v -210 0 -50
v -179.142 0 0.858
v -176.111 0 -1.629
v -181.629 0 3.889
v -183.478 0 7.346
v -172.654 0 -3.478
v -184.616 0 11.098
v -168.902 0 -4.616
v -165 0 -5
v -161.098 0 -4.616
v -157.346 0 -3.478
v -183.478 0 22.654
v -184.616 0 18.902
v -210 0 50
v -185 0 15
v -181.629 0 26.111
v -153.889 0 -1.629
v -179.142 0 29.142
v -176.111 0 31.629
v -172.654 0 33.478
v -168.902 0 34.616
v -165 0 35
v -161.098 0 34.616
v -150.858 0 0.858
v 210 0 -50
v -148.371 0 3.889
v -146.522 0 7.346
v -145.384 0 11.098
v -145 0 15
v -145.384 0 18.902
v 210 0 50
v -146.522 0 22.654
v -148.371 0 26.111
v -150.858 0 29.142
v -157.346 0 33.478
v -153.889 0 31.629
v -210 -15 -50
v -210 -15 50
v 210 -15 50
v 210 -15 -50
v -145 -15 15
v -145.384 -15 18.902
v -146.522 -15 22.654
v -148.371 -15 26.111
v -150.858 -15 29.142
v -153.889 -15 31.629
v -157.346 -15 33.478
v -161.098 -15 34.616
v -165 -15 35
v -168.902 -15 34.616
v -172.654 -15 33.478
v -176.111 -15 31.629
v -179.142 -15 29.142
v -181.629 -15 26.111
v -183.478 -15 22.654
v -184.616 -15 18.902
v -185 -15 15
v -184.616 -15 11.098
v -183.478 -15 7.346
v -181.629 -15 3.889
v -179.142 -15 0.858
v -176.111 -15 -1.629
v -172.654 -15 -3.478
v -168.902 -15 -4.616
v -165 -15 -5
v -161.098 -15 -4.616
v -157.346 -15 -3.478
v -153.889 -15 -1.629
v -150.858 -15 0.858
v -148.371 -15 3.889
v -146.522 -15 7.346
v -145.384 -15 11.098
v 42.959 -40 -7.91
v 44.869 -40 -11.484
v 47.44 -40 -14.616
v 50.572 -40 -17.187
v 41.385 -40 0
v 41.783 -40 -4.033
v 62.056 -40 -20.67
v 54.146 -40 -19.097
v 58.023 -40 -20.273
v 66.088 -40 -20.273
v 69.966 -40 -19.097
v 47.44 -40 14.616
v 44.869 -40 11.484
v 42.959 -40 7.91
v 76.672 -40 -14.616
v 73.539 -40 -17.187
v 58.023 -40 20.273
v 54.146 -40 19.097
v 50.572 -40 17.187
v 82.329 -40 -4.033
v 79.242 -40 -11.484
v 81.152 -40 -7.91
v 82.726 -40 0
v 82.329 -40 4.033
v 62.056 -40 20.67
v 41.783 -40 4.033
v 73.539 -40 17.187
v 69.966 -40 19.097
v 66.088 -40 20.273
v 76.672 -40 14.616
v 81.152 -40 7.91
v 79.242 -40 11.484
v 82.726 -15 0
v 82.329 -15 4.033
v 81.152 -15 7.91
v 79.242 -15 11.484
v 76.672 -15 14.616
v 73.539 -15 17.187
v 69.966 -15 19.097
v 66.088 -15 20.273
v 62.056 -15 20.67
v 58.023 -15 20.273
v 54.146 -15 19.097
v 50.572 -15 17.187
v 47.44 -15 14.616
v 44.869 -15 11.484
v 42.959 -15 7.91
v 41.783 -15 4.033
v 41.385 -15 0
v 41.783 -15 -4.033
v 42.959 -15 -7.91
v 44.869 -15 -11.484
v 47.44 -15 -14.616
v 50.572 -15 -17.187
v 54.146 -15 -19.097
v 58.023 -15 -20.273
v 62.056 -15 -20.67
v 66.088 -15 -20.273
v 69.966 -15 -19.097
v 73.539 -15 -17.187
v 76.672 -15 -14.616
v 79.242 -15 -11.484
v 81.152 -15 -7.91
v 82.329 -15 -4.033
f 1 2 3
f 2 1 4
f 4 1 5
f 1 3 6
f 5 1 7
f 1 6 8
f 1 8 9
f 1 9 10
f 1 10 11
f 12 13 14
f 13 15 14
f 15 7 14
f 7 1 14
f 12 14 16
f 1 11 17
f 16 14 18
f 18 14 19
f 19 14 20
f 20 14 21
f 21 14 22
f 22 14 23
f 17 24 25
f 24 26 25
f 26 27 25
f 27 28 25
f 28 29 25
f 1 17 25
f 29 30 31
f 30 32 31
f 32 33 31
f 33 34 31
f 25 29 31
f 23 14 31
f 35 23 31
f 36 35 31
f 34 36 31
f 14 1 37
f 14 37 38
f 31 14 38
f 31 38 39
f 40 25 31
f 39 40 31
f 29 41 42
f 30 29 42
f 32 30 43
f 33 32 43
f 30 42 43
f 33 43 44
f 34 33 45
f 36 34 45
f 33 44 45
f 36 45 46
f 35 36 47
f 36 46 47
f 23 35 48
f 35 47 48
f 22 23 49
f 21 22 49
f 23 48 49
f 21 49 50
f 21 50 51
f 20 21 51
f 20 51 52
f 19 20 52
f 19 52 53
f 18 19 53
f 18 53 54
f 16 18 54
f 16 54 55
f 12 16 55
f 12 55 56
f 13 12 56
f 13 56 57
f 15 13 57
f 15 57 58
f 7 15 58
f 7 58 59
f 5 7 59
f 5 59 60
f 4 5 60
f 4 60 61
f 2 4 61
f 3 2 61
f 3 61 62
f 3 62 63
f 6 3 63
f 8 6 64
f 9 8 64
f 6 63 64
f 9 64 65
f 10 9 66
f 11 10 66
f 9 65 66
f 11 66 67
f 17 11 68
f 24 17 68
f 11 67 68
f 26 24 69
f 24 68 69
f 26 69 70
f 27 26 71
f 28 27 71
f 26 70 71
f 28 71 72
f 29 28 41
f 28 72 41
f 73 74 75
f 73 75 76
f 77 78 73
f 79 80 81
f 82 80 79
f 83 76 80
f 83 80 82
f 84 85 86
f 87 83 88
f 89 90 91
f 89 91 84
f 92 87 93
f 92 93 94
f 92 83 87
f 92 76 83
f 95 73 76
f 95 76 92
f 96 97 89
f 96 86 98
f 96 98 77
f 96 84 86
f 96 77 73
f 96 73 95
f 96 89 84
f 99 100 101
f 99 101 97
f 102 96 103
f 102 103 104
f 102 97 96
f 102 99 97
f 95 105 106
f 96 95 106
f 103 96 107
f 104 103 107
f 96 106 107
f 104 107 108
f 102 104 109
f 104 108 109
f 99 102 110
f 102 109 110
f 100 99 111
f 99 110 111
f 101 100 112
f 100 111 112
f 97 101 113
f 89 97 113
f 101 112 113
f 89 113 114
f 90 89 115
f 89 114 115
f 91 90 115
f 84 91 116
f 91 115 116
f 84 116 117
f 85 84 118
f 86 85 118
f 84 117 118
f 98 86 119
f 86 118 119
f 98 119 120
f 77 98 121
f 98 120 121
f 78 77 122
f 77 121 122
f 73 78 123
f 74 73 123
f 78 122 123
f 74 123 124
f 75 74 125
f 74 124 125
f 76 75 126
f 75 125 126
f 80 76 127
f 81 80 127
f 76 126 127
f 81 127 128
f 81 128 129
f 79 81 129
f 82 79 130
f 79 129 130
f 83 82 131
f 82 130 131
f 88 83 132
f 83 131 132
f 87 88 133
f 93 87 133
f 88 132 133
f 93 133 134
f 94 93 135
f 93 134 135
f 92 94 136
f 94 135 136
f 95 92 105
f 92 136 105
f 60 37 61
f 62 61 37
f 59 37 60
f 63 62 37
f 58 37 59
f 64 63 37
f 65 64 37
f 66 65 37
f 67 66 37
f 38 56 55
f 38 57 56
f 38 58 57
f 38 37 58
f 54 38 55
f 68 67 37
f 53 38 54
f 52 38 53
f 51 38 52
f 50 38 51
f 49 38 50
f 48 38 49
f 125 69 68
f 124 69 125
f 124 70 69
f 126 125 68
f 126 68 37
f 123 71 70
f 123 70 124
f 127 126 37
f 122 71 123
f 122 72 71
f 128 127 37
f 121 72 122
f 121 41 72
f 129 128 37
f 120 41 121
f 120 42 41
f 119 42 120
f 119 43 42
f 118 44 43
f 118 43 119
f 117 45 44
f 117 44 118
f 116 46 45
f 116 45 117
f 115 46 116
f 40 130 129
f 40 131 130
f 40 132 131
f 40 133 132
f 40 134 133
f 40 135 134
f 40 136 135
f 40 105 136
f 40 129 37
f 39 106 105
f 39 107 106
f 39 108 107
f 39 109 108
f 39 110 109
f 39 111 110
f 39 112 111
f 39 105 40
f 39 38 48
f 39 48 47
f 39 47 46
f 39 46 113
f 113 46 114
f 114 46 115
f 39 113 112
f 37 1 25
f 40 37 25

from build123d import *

# Parameters (mm, degrees)
F0_W     = 420
F0_H     = 100
F1_DEPTH = 15
F2_R     = 20
F3_DEPTH = 15.001
F4_R     = 20.670136
F5_DEPTH = 25


with BuildPart() as f1:
    # F0 (on Front) → F1 (new body)
    with BuildSketch(Plane.XZ):
        Rectangle(F0_W, F0_H)
    extrude(amount=F1_DEPTH)

    # F2 (on face) → F3 (cut, through all)
    with BuildSketch(Plane.XZ.offset(15)):
        with Locations((-165, 15)):
            Circle(F2_R)
    extrude(amount=-F3_DEPTH, mode=Mode.SUBTRACT)

    # F4 (on face) → F5 (join)
    with BuildSketch(Plane.XZ.offset(15)):
        with Locations((62.055632, 0)):
            Circle(F4_R)
    extrude(amount=F5_DEPTH)


solid = f1.part
